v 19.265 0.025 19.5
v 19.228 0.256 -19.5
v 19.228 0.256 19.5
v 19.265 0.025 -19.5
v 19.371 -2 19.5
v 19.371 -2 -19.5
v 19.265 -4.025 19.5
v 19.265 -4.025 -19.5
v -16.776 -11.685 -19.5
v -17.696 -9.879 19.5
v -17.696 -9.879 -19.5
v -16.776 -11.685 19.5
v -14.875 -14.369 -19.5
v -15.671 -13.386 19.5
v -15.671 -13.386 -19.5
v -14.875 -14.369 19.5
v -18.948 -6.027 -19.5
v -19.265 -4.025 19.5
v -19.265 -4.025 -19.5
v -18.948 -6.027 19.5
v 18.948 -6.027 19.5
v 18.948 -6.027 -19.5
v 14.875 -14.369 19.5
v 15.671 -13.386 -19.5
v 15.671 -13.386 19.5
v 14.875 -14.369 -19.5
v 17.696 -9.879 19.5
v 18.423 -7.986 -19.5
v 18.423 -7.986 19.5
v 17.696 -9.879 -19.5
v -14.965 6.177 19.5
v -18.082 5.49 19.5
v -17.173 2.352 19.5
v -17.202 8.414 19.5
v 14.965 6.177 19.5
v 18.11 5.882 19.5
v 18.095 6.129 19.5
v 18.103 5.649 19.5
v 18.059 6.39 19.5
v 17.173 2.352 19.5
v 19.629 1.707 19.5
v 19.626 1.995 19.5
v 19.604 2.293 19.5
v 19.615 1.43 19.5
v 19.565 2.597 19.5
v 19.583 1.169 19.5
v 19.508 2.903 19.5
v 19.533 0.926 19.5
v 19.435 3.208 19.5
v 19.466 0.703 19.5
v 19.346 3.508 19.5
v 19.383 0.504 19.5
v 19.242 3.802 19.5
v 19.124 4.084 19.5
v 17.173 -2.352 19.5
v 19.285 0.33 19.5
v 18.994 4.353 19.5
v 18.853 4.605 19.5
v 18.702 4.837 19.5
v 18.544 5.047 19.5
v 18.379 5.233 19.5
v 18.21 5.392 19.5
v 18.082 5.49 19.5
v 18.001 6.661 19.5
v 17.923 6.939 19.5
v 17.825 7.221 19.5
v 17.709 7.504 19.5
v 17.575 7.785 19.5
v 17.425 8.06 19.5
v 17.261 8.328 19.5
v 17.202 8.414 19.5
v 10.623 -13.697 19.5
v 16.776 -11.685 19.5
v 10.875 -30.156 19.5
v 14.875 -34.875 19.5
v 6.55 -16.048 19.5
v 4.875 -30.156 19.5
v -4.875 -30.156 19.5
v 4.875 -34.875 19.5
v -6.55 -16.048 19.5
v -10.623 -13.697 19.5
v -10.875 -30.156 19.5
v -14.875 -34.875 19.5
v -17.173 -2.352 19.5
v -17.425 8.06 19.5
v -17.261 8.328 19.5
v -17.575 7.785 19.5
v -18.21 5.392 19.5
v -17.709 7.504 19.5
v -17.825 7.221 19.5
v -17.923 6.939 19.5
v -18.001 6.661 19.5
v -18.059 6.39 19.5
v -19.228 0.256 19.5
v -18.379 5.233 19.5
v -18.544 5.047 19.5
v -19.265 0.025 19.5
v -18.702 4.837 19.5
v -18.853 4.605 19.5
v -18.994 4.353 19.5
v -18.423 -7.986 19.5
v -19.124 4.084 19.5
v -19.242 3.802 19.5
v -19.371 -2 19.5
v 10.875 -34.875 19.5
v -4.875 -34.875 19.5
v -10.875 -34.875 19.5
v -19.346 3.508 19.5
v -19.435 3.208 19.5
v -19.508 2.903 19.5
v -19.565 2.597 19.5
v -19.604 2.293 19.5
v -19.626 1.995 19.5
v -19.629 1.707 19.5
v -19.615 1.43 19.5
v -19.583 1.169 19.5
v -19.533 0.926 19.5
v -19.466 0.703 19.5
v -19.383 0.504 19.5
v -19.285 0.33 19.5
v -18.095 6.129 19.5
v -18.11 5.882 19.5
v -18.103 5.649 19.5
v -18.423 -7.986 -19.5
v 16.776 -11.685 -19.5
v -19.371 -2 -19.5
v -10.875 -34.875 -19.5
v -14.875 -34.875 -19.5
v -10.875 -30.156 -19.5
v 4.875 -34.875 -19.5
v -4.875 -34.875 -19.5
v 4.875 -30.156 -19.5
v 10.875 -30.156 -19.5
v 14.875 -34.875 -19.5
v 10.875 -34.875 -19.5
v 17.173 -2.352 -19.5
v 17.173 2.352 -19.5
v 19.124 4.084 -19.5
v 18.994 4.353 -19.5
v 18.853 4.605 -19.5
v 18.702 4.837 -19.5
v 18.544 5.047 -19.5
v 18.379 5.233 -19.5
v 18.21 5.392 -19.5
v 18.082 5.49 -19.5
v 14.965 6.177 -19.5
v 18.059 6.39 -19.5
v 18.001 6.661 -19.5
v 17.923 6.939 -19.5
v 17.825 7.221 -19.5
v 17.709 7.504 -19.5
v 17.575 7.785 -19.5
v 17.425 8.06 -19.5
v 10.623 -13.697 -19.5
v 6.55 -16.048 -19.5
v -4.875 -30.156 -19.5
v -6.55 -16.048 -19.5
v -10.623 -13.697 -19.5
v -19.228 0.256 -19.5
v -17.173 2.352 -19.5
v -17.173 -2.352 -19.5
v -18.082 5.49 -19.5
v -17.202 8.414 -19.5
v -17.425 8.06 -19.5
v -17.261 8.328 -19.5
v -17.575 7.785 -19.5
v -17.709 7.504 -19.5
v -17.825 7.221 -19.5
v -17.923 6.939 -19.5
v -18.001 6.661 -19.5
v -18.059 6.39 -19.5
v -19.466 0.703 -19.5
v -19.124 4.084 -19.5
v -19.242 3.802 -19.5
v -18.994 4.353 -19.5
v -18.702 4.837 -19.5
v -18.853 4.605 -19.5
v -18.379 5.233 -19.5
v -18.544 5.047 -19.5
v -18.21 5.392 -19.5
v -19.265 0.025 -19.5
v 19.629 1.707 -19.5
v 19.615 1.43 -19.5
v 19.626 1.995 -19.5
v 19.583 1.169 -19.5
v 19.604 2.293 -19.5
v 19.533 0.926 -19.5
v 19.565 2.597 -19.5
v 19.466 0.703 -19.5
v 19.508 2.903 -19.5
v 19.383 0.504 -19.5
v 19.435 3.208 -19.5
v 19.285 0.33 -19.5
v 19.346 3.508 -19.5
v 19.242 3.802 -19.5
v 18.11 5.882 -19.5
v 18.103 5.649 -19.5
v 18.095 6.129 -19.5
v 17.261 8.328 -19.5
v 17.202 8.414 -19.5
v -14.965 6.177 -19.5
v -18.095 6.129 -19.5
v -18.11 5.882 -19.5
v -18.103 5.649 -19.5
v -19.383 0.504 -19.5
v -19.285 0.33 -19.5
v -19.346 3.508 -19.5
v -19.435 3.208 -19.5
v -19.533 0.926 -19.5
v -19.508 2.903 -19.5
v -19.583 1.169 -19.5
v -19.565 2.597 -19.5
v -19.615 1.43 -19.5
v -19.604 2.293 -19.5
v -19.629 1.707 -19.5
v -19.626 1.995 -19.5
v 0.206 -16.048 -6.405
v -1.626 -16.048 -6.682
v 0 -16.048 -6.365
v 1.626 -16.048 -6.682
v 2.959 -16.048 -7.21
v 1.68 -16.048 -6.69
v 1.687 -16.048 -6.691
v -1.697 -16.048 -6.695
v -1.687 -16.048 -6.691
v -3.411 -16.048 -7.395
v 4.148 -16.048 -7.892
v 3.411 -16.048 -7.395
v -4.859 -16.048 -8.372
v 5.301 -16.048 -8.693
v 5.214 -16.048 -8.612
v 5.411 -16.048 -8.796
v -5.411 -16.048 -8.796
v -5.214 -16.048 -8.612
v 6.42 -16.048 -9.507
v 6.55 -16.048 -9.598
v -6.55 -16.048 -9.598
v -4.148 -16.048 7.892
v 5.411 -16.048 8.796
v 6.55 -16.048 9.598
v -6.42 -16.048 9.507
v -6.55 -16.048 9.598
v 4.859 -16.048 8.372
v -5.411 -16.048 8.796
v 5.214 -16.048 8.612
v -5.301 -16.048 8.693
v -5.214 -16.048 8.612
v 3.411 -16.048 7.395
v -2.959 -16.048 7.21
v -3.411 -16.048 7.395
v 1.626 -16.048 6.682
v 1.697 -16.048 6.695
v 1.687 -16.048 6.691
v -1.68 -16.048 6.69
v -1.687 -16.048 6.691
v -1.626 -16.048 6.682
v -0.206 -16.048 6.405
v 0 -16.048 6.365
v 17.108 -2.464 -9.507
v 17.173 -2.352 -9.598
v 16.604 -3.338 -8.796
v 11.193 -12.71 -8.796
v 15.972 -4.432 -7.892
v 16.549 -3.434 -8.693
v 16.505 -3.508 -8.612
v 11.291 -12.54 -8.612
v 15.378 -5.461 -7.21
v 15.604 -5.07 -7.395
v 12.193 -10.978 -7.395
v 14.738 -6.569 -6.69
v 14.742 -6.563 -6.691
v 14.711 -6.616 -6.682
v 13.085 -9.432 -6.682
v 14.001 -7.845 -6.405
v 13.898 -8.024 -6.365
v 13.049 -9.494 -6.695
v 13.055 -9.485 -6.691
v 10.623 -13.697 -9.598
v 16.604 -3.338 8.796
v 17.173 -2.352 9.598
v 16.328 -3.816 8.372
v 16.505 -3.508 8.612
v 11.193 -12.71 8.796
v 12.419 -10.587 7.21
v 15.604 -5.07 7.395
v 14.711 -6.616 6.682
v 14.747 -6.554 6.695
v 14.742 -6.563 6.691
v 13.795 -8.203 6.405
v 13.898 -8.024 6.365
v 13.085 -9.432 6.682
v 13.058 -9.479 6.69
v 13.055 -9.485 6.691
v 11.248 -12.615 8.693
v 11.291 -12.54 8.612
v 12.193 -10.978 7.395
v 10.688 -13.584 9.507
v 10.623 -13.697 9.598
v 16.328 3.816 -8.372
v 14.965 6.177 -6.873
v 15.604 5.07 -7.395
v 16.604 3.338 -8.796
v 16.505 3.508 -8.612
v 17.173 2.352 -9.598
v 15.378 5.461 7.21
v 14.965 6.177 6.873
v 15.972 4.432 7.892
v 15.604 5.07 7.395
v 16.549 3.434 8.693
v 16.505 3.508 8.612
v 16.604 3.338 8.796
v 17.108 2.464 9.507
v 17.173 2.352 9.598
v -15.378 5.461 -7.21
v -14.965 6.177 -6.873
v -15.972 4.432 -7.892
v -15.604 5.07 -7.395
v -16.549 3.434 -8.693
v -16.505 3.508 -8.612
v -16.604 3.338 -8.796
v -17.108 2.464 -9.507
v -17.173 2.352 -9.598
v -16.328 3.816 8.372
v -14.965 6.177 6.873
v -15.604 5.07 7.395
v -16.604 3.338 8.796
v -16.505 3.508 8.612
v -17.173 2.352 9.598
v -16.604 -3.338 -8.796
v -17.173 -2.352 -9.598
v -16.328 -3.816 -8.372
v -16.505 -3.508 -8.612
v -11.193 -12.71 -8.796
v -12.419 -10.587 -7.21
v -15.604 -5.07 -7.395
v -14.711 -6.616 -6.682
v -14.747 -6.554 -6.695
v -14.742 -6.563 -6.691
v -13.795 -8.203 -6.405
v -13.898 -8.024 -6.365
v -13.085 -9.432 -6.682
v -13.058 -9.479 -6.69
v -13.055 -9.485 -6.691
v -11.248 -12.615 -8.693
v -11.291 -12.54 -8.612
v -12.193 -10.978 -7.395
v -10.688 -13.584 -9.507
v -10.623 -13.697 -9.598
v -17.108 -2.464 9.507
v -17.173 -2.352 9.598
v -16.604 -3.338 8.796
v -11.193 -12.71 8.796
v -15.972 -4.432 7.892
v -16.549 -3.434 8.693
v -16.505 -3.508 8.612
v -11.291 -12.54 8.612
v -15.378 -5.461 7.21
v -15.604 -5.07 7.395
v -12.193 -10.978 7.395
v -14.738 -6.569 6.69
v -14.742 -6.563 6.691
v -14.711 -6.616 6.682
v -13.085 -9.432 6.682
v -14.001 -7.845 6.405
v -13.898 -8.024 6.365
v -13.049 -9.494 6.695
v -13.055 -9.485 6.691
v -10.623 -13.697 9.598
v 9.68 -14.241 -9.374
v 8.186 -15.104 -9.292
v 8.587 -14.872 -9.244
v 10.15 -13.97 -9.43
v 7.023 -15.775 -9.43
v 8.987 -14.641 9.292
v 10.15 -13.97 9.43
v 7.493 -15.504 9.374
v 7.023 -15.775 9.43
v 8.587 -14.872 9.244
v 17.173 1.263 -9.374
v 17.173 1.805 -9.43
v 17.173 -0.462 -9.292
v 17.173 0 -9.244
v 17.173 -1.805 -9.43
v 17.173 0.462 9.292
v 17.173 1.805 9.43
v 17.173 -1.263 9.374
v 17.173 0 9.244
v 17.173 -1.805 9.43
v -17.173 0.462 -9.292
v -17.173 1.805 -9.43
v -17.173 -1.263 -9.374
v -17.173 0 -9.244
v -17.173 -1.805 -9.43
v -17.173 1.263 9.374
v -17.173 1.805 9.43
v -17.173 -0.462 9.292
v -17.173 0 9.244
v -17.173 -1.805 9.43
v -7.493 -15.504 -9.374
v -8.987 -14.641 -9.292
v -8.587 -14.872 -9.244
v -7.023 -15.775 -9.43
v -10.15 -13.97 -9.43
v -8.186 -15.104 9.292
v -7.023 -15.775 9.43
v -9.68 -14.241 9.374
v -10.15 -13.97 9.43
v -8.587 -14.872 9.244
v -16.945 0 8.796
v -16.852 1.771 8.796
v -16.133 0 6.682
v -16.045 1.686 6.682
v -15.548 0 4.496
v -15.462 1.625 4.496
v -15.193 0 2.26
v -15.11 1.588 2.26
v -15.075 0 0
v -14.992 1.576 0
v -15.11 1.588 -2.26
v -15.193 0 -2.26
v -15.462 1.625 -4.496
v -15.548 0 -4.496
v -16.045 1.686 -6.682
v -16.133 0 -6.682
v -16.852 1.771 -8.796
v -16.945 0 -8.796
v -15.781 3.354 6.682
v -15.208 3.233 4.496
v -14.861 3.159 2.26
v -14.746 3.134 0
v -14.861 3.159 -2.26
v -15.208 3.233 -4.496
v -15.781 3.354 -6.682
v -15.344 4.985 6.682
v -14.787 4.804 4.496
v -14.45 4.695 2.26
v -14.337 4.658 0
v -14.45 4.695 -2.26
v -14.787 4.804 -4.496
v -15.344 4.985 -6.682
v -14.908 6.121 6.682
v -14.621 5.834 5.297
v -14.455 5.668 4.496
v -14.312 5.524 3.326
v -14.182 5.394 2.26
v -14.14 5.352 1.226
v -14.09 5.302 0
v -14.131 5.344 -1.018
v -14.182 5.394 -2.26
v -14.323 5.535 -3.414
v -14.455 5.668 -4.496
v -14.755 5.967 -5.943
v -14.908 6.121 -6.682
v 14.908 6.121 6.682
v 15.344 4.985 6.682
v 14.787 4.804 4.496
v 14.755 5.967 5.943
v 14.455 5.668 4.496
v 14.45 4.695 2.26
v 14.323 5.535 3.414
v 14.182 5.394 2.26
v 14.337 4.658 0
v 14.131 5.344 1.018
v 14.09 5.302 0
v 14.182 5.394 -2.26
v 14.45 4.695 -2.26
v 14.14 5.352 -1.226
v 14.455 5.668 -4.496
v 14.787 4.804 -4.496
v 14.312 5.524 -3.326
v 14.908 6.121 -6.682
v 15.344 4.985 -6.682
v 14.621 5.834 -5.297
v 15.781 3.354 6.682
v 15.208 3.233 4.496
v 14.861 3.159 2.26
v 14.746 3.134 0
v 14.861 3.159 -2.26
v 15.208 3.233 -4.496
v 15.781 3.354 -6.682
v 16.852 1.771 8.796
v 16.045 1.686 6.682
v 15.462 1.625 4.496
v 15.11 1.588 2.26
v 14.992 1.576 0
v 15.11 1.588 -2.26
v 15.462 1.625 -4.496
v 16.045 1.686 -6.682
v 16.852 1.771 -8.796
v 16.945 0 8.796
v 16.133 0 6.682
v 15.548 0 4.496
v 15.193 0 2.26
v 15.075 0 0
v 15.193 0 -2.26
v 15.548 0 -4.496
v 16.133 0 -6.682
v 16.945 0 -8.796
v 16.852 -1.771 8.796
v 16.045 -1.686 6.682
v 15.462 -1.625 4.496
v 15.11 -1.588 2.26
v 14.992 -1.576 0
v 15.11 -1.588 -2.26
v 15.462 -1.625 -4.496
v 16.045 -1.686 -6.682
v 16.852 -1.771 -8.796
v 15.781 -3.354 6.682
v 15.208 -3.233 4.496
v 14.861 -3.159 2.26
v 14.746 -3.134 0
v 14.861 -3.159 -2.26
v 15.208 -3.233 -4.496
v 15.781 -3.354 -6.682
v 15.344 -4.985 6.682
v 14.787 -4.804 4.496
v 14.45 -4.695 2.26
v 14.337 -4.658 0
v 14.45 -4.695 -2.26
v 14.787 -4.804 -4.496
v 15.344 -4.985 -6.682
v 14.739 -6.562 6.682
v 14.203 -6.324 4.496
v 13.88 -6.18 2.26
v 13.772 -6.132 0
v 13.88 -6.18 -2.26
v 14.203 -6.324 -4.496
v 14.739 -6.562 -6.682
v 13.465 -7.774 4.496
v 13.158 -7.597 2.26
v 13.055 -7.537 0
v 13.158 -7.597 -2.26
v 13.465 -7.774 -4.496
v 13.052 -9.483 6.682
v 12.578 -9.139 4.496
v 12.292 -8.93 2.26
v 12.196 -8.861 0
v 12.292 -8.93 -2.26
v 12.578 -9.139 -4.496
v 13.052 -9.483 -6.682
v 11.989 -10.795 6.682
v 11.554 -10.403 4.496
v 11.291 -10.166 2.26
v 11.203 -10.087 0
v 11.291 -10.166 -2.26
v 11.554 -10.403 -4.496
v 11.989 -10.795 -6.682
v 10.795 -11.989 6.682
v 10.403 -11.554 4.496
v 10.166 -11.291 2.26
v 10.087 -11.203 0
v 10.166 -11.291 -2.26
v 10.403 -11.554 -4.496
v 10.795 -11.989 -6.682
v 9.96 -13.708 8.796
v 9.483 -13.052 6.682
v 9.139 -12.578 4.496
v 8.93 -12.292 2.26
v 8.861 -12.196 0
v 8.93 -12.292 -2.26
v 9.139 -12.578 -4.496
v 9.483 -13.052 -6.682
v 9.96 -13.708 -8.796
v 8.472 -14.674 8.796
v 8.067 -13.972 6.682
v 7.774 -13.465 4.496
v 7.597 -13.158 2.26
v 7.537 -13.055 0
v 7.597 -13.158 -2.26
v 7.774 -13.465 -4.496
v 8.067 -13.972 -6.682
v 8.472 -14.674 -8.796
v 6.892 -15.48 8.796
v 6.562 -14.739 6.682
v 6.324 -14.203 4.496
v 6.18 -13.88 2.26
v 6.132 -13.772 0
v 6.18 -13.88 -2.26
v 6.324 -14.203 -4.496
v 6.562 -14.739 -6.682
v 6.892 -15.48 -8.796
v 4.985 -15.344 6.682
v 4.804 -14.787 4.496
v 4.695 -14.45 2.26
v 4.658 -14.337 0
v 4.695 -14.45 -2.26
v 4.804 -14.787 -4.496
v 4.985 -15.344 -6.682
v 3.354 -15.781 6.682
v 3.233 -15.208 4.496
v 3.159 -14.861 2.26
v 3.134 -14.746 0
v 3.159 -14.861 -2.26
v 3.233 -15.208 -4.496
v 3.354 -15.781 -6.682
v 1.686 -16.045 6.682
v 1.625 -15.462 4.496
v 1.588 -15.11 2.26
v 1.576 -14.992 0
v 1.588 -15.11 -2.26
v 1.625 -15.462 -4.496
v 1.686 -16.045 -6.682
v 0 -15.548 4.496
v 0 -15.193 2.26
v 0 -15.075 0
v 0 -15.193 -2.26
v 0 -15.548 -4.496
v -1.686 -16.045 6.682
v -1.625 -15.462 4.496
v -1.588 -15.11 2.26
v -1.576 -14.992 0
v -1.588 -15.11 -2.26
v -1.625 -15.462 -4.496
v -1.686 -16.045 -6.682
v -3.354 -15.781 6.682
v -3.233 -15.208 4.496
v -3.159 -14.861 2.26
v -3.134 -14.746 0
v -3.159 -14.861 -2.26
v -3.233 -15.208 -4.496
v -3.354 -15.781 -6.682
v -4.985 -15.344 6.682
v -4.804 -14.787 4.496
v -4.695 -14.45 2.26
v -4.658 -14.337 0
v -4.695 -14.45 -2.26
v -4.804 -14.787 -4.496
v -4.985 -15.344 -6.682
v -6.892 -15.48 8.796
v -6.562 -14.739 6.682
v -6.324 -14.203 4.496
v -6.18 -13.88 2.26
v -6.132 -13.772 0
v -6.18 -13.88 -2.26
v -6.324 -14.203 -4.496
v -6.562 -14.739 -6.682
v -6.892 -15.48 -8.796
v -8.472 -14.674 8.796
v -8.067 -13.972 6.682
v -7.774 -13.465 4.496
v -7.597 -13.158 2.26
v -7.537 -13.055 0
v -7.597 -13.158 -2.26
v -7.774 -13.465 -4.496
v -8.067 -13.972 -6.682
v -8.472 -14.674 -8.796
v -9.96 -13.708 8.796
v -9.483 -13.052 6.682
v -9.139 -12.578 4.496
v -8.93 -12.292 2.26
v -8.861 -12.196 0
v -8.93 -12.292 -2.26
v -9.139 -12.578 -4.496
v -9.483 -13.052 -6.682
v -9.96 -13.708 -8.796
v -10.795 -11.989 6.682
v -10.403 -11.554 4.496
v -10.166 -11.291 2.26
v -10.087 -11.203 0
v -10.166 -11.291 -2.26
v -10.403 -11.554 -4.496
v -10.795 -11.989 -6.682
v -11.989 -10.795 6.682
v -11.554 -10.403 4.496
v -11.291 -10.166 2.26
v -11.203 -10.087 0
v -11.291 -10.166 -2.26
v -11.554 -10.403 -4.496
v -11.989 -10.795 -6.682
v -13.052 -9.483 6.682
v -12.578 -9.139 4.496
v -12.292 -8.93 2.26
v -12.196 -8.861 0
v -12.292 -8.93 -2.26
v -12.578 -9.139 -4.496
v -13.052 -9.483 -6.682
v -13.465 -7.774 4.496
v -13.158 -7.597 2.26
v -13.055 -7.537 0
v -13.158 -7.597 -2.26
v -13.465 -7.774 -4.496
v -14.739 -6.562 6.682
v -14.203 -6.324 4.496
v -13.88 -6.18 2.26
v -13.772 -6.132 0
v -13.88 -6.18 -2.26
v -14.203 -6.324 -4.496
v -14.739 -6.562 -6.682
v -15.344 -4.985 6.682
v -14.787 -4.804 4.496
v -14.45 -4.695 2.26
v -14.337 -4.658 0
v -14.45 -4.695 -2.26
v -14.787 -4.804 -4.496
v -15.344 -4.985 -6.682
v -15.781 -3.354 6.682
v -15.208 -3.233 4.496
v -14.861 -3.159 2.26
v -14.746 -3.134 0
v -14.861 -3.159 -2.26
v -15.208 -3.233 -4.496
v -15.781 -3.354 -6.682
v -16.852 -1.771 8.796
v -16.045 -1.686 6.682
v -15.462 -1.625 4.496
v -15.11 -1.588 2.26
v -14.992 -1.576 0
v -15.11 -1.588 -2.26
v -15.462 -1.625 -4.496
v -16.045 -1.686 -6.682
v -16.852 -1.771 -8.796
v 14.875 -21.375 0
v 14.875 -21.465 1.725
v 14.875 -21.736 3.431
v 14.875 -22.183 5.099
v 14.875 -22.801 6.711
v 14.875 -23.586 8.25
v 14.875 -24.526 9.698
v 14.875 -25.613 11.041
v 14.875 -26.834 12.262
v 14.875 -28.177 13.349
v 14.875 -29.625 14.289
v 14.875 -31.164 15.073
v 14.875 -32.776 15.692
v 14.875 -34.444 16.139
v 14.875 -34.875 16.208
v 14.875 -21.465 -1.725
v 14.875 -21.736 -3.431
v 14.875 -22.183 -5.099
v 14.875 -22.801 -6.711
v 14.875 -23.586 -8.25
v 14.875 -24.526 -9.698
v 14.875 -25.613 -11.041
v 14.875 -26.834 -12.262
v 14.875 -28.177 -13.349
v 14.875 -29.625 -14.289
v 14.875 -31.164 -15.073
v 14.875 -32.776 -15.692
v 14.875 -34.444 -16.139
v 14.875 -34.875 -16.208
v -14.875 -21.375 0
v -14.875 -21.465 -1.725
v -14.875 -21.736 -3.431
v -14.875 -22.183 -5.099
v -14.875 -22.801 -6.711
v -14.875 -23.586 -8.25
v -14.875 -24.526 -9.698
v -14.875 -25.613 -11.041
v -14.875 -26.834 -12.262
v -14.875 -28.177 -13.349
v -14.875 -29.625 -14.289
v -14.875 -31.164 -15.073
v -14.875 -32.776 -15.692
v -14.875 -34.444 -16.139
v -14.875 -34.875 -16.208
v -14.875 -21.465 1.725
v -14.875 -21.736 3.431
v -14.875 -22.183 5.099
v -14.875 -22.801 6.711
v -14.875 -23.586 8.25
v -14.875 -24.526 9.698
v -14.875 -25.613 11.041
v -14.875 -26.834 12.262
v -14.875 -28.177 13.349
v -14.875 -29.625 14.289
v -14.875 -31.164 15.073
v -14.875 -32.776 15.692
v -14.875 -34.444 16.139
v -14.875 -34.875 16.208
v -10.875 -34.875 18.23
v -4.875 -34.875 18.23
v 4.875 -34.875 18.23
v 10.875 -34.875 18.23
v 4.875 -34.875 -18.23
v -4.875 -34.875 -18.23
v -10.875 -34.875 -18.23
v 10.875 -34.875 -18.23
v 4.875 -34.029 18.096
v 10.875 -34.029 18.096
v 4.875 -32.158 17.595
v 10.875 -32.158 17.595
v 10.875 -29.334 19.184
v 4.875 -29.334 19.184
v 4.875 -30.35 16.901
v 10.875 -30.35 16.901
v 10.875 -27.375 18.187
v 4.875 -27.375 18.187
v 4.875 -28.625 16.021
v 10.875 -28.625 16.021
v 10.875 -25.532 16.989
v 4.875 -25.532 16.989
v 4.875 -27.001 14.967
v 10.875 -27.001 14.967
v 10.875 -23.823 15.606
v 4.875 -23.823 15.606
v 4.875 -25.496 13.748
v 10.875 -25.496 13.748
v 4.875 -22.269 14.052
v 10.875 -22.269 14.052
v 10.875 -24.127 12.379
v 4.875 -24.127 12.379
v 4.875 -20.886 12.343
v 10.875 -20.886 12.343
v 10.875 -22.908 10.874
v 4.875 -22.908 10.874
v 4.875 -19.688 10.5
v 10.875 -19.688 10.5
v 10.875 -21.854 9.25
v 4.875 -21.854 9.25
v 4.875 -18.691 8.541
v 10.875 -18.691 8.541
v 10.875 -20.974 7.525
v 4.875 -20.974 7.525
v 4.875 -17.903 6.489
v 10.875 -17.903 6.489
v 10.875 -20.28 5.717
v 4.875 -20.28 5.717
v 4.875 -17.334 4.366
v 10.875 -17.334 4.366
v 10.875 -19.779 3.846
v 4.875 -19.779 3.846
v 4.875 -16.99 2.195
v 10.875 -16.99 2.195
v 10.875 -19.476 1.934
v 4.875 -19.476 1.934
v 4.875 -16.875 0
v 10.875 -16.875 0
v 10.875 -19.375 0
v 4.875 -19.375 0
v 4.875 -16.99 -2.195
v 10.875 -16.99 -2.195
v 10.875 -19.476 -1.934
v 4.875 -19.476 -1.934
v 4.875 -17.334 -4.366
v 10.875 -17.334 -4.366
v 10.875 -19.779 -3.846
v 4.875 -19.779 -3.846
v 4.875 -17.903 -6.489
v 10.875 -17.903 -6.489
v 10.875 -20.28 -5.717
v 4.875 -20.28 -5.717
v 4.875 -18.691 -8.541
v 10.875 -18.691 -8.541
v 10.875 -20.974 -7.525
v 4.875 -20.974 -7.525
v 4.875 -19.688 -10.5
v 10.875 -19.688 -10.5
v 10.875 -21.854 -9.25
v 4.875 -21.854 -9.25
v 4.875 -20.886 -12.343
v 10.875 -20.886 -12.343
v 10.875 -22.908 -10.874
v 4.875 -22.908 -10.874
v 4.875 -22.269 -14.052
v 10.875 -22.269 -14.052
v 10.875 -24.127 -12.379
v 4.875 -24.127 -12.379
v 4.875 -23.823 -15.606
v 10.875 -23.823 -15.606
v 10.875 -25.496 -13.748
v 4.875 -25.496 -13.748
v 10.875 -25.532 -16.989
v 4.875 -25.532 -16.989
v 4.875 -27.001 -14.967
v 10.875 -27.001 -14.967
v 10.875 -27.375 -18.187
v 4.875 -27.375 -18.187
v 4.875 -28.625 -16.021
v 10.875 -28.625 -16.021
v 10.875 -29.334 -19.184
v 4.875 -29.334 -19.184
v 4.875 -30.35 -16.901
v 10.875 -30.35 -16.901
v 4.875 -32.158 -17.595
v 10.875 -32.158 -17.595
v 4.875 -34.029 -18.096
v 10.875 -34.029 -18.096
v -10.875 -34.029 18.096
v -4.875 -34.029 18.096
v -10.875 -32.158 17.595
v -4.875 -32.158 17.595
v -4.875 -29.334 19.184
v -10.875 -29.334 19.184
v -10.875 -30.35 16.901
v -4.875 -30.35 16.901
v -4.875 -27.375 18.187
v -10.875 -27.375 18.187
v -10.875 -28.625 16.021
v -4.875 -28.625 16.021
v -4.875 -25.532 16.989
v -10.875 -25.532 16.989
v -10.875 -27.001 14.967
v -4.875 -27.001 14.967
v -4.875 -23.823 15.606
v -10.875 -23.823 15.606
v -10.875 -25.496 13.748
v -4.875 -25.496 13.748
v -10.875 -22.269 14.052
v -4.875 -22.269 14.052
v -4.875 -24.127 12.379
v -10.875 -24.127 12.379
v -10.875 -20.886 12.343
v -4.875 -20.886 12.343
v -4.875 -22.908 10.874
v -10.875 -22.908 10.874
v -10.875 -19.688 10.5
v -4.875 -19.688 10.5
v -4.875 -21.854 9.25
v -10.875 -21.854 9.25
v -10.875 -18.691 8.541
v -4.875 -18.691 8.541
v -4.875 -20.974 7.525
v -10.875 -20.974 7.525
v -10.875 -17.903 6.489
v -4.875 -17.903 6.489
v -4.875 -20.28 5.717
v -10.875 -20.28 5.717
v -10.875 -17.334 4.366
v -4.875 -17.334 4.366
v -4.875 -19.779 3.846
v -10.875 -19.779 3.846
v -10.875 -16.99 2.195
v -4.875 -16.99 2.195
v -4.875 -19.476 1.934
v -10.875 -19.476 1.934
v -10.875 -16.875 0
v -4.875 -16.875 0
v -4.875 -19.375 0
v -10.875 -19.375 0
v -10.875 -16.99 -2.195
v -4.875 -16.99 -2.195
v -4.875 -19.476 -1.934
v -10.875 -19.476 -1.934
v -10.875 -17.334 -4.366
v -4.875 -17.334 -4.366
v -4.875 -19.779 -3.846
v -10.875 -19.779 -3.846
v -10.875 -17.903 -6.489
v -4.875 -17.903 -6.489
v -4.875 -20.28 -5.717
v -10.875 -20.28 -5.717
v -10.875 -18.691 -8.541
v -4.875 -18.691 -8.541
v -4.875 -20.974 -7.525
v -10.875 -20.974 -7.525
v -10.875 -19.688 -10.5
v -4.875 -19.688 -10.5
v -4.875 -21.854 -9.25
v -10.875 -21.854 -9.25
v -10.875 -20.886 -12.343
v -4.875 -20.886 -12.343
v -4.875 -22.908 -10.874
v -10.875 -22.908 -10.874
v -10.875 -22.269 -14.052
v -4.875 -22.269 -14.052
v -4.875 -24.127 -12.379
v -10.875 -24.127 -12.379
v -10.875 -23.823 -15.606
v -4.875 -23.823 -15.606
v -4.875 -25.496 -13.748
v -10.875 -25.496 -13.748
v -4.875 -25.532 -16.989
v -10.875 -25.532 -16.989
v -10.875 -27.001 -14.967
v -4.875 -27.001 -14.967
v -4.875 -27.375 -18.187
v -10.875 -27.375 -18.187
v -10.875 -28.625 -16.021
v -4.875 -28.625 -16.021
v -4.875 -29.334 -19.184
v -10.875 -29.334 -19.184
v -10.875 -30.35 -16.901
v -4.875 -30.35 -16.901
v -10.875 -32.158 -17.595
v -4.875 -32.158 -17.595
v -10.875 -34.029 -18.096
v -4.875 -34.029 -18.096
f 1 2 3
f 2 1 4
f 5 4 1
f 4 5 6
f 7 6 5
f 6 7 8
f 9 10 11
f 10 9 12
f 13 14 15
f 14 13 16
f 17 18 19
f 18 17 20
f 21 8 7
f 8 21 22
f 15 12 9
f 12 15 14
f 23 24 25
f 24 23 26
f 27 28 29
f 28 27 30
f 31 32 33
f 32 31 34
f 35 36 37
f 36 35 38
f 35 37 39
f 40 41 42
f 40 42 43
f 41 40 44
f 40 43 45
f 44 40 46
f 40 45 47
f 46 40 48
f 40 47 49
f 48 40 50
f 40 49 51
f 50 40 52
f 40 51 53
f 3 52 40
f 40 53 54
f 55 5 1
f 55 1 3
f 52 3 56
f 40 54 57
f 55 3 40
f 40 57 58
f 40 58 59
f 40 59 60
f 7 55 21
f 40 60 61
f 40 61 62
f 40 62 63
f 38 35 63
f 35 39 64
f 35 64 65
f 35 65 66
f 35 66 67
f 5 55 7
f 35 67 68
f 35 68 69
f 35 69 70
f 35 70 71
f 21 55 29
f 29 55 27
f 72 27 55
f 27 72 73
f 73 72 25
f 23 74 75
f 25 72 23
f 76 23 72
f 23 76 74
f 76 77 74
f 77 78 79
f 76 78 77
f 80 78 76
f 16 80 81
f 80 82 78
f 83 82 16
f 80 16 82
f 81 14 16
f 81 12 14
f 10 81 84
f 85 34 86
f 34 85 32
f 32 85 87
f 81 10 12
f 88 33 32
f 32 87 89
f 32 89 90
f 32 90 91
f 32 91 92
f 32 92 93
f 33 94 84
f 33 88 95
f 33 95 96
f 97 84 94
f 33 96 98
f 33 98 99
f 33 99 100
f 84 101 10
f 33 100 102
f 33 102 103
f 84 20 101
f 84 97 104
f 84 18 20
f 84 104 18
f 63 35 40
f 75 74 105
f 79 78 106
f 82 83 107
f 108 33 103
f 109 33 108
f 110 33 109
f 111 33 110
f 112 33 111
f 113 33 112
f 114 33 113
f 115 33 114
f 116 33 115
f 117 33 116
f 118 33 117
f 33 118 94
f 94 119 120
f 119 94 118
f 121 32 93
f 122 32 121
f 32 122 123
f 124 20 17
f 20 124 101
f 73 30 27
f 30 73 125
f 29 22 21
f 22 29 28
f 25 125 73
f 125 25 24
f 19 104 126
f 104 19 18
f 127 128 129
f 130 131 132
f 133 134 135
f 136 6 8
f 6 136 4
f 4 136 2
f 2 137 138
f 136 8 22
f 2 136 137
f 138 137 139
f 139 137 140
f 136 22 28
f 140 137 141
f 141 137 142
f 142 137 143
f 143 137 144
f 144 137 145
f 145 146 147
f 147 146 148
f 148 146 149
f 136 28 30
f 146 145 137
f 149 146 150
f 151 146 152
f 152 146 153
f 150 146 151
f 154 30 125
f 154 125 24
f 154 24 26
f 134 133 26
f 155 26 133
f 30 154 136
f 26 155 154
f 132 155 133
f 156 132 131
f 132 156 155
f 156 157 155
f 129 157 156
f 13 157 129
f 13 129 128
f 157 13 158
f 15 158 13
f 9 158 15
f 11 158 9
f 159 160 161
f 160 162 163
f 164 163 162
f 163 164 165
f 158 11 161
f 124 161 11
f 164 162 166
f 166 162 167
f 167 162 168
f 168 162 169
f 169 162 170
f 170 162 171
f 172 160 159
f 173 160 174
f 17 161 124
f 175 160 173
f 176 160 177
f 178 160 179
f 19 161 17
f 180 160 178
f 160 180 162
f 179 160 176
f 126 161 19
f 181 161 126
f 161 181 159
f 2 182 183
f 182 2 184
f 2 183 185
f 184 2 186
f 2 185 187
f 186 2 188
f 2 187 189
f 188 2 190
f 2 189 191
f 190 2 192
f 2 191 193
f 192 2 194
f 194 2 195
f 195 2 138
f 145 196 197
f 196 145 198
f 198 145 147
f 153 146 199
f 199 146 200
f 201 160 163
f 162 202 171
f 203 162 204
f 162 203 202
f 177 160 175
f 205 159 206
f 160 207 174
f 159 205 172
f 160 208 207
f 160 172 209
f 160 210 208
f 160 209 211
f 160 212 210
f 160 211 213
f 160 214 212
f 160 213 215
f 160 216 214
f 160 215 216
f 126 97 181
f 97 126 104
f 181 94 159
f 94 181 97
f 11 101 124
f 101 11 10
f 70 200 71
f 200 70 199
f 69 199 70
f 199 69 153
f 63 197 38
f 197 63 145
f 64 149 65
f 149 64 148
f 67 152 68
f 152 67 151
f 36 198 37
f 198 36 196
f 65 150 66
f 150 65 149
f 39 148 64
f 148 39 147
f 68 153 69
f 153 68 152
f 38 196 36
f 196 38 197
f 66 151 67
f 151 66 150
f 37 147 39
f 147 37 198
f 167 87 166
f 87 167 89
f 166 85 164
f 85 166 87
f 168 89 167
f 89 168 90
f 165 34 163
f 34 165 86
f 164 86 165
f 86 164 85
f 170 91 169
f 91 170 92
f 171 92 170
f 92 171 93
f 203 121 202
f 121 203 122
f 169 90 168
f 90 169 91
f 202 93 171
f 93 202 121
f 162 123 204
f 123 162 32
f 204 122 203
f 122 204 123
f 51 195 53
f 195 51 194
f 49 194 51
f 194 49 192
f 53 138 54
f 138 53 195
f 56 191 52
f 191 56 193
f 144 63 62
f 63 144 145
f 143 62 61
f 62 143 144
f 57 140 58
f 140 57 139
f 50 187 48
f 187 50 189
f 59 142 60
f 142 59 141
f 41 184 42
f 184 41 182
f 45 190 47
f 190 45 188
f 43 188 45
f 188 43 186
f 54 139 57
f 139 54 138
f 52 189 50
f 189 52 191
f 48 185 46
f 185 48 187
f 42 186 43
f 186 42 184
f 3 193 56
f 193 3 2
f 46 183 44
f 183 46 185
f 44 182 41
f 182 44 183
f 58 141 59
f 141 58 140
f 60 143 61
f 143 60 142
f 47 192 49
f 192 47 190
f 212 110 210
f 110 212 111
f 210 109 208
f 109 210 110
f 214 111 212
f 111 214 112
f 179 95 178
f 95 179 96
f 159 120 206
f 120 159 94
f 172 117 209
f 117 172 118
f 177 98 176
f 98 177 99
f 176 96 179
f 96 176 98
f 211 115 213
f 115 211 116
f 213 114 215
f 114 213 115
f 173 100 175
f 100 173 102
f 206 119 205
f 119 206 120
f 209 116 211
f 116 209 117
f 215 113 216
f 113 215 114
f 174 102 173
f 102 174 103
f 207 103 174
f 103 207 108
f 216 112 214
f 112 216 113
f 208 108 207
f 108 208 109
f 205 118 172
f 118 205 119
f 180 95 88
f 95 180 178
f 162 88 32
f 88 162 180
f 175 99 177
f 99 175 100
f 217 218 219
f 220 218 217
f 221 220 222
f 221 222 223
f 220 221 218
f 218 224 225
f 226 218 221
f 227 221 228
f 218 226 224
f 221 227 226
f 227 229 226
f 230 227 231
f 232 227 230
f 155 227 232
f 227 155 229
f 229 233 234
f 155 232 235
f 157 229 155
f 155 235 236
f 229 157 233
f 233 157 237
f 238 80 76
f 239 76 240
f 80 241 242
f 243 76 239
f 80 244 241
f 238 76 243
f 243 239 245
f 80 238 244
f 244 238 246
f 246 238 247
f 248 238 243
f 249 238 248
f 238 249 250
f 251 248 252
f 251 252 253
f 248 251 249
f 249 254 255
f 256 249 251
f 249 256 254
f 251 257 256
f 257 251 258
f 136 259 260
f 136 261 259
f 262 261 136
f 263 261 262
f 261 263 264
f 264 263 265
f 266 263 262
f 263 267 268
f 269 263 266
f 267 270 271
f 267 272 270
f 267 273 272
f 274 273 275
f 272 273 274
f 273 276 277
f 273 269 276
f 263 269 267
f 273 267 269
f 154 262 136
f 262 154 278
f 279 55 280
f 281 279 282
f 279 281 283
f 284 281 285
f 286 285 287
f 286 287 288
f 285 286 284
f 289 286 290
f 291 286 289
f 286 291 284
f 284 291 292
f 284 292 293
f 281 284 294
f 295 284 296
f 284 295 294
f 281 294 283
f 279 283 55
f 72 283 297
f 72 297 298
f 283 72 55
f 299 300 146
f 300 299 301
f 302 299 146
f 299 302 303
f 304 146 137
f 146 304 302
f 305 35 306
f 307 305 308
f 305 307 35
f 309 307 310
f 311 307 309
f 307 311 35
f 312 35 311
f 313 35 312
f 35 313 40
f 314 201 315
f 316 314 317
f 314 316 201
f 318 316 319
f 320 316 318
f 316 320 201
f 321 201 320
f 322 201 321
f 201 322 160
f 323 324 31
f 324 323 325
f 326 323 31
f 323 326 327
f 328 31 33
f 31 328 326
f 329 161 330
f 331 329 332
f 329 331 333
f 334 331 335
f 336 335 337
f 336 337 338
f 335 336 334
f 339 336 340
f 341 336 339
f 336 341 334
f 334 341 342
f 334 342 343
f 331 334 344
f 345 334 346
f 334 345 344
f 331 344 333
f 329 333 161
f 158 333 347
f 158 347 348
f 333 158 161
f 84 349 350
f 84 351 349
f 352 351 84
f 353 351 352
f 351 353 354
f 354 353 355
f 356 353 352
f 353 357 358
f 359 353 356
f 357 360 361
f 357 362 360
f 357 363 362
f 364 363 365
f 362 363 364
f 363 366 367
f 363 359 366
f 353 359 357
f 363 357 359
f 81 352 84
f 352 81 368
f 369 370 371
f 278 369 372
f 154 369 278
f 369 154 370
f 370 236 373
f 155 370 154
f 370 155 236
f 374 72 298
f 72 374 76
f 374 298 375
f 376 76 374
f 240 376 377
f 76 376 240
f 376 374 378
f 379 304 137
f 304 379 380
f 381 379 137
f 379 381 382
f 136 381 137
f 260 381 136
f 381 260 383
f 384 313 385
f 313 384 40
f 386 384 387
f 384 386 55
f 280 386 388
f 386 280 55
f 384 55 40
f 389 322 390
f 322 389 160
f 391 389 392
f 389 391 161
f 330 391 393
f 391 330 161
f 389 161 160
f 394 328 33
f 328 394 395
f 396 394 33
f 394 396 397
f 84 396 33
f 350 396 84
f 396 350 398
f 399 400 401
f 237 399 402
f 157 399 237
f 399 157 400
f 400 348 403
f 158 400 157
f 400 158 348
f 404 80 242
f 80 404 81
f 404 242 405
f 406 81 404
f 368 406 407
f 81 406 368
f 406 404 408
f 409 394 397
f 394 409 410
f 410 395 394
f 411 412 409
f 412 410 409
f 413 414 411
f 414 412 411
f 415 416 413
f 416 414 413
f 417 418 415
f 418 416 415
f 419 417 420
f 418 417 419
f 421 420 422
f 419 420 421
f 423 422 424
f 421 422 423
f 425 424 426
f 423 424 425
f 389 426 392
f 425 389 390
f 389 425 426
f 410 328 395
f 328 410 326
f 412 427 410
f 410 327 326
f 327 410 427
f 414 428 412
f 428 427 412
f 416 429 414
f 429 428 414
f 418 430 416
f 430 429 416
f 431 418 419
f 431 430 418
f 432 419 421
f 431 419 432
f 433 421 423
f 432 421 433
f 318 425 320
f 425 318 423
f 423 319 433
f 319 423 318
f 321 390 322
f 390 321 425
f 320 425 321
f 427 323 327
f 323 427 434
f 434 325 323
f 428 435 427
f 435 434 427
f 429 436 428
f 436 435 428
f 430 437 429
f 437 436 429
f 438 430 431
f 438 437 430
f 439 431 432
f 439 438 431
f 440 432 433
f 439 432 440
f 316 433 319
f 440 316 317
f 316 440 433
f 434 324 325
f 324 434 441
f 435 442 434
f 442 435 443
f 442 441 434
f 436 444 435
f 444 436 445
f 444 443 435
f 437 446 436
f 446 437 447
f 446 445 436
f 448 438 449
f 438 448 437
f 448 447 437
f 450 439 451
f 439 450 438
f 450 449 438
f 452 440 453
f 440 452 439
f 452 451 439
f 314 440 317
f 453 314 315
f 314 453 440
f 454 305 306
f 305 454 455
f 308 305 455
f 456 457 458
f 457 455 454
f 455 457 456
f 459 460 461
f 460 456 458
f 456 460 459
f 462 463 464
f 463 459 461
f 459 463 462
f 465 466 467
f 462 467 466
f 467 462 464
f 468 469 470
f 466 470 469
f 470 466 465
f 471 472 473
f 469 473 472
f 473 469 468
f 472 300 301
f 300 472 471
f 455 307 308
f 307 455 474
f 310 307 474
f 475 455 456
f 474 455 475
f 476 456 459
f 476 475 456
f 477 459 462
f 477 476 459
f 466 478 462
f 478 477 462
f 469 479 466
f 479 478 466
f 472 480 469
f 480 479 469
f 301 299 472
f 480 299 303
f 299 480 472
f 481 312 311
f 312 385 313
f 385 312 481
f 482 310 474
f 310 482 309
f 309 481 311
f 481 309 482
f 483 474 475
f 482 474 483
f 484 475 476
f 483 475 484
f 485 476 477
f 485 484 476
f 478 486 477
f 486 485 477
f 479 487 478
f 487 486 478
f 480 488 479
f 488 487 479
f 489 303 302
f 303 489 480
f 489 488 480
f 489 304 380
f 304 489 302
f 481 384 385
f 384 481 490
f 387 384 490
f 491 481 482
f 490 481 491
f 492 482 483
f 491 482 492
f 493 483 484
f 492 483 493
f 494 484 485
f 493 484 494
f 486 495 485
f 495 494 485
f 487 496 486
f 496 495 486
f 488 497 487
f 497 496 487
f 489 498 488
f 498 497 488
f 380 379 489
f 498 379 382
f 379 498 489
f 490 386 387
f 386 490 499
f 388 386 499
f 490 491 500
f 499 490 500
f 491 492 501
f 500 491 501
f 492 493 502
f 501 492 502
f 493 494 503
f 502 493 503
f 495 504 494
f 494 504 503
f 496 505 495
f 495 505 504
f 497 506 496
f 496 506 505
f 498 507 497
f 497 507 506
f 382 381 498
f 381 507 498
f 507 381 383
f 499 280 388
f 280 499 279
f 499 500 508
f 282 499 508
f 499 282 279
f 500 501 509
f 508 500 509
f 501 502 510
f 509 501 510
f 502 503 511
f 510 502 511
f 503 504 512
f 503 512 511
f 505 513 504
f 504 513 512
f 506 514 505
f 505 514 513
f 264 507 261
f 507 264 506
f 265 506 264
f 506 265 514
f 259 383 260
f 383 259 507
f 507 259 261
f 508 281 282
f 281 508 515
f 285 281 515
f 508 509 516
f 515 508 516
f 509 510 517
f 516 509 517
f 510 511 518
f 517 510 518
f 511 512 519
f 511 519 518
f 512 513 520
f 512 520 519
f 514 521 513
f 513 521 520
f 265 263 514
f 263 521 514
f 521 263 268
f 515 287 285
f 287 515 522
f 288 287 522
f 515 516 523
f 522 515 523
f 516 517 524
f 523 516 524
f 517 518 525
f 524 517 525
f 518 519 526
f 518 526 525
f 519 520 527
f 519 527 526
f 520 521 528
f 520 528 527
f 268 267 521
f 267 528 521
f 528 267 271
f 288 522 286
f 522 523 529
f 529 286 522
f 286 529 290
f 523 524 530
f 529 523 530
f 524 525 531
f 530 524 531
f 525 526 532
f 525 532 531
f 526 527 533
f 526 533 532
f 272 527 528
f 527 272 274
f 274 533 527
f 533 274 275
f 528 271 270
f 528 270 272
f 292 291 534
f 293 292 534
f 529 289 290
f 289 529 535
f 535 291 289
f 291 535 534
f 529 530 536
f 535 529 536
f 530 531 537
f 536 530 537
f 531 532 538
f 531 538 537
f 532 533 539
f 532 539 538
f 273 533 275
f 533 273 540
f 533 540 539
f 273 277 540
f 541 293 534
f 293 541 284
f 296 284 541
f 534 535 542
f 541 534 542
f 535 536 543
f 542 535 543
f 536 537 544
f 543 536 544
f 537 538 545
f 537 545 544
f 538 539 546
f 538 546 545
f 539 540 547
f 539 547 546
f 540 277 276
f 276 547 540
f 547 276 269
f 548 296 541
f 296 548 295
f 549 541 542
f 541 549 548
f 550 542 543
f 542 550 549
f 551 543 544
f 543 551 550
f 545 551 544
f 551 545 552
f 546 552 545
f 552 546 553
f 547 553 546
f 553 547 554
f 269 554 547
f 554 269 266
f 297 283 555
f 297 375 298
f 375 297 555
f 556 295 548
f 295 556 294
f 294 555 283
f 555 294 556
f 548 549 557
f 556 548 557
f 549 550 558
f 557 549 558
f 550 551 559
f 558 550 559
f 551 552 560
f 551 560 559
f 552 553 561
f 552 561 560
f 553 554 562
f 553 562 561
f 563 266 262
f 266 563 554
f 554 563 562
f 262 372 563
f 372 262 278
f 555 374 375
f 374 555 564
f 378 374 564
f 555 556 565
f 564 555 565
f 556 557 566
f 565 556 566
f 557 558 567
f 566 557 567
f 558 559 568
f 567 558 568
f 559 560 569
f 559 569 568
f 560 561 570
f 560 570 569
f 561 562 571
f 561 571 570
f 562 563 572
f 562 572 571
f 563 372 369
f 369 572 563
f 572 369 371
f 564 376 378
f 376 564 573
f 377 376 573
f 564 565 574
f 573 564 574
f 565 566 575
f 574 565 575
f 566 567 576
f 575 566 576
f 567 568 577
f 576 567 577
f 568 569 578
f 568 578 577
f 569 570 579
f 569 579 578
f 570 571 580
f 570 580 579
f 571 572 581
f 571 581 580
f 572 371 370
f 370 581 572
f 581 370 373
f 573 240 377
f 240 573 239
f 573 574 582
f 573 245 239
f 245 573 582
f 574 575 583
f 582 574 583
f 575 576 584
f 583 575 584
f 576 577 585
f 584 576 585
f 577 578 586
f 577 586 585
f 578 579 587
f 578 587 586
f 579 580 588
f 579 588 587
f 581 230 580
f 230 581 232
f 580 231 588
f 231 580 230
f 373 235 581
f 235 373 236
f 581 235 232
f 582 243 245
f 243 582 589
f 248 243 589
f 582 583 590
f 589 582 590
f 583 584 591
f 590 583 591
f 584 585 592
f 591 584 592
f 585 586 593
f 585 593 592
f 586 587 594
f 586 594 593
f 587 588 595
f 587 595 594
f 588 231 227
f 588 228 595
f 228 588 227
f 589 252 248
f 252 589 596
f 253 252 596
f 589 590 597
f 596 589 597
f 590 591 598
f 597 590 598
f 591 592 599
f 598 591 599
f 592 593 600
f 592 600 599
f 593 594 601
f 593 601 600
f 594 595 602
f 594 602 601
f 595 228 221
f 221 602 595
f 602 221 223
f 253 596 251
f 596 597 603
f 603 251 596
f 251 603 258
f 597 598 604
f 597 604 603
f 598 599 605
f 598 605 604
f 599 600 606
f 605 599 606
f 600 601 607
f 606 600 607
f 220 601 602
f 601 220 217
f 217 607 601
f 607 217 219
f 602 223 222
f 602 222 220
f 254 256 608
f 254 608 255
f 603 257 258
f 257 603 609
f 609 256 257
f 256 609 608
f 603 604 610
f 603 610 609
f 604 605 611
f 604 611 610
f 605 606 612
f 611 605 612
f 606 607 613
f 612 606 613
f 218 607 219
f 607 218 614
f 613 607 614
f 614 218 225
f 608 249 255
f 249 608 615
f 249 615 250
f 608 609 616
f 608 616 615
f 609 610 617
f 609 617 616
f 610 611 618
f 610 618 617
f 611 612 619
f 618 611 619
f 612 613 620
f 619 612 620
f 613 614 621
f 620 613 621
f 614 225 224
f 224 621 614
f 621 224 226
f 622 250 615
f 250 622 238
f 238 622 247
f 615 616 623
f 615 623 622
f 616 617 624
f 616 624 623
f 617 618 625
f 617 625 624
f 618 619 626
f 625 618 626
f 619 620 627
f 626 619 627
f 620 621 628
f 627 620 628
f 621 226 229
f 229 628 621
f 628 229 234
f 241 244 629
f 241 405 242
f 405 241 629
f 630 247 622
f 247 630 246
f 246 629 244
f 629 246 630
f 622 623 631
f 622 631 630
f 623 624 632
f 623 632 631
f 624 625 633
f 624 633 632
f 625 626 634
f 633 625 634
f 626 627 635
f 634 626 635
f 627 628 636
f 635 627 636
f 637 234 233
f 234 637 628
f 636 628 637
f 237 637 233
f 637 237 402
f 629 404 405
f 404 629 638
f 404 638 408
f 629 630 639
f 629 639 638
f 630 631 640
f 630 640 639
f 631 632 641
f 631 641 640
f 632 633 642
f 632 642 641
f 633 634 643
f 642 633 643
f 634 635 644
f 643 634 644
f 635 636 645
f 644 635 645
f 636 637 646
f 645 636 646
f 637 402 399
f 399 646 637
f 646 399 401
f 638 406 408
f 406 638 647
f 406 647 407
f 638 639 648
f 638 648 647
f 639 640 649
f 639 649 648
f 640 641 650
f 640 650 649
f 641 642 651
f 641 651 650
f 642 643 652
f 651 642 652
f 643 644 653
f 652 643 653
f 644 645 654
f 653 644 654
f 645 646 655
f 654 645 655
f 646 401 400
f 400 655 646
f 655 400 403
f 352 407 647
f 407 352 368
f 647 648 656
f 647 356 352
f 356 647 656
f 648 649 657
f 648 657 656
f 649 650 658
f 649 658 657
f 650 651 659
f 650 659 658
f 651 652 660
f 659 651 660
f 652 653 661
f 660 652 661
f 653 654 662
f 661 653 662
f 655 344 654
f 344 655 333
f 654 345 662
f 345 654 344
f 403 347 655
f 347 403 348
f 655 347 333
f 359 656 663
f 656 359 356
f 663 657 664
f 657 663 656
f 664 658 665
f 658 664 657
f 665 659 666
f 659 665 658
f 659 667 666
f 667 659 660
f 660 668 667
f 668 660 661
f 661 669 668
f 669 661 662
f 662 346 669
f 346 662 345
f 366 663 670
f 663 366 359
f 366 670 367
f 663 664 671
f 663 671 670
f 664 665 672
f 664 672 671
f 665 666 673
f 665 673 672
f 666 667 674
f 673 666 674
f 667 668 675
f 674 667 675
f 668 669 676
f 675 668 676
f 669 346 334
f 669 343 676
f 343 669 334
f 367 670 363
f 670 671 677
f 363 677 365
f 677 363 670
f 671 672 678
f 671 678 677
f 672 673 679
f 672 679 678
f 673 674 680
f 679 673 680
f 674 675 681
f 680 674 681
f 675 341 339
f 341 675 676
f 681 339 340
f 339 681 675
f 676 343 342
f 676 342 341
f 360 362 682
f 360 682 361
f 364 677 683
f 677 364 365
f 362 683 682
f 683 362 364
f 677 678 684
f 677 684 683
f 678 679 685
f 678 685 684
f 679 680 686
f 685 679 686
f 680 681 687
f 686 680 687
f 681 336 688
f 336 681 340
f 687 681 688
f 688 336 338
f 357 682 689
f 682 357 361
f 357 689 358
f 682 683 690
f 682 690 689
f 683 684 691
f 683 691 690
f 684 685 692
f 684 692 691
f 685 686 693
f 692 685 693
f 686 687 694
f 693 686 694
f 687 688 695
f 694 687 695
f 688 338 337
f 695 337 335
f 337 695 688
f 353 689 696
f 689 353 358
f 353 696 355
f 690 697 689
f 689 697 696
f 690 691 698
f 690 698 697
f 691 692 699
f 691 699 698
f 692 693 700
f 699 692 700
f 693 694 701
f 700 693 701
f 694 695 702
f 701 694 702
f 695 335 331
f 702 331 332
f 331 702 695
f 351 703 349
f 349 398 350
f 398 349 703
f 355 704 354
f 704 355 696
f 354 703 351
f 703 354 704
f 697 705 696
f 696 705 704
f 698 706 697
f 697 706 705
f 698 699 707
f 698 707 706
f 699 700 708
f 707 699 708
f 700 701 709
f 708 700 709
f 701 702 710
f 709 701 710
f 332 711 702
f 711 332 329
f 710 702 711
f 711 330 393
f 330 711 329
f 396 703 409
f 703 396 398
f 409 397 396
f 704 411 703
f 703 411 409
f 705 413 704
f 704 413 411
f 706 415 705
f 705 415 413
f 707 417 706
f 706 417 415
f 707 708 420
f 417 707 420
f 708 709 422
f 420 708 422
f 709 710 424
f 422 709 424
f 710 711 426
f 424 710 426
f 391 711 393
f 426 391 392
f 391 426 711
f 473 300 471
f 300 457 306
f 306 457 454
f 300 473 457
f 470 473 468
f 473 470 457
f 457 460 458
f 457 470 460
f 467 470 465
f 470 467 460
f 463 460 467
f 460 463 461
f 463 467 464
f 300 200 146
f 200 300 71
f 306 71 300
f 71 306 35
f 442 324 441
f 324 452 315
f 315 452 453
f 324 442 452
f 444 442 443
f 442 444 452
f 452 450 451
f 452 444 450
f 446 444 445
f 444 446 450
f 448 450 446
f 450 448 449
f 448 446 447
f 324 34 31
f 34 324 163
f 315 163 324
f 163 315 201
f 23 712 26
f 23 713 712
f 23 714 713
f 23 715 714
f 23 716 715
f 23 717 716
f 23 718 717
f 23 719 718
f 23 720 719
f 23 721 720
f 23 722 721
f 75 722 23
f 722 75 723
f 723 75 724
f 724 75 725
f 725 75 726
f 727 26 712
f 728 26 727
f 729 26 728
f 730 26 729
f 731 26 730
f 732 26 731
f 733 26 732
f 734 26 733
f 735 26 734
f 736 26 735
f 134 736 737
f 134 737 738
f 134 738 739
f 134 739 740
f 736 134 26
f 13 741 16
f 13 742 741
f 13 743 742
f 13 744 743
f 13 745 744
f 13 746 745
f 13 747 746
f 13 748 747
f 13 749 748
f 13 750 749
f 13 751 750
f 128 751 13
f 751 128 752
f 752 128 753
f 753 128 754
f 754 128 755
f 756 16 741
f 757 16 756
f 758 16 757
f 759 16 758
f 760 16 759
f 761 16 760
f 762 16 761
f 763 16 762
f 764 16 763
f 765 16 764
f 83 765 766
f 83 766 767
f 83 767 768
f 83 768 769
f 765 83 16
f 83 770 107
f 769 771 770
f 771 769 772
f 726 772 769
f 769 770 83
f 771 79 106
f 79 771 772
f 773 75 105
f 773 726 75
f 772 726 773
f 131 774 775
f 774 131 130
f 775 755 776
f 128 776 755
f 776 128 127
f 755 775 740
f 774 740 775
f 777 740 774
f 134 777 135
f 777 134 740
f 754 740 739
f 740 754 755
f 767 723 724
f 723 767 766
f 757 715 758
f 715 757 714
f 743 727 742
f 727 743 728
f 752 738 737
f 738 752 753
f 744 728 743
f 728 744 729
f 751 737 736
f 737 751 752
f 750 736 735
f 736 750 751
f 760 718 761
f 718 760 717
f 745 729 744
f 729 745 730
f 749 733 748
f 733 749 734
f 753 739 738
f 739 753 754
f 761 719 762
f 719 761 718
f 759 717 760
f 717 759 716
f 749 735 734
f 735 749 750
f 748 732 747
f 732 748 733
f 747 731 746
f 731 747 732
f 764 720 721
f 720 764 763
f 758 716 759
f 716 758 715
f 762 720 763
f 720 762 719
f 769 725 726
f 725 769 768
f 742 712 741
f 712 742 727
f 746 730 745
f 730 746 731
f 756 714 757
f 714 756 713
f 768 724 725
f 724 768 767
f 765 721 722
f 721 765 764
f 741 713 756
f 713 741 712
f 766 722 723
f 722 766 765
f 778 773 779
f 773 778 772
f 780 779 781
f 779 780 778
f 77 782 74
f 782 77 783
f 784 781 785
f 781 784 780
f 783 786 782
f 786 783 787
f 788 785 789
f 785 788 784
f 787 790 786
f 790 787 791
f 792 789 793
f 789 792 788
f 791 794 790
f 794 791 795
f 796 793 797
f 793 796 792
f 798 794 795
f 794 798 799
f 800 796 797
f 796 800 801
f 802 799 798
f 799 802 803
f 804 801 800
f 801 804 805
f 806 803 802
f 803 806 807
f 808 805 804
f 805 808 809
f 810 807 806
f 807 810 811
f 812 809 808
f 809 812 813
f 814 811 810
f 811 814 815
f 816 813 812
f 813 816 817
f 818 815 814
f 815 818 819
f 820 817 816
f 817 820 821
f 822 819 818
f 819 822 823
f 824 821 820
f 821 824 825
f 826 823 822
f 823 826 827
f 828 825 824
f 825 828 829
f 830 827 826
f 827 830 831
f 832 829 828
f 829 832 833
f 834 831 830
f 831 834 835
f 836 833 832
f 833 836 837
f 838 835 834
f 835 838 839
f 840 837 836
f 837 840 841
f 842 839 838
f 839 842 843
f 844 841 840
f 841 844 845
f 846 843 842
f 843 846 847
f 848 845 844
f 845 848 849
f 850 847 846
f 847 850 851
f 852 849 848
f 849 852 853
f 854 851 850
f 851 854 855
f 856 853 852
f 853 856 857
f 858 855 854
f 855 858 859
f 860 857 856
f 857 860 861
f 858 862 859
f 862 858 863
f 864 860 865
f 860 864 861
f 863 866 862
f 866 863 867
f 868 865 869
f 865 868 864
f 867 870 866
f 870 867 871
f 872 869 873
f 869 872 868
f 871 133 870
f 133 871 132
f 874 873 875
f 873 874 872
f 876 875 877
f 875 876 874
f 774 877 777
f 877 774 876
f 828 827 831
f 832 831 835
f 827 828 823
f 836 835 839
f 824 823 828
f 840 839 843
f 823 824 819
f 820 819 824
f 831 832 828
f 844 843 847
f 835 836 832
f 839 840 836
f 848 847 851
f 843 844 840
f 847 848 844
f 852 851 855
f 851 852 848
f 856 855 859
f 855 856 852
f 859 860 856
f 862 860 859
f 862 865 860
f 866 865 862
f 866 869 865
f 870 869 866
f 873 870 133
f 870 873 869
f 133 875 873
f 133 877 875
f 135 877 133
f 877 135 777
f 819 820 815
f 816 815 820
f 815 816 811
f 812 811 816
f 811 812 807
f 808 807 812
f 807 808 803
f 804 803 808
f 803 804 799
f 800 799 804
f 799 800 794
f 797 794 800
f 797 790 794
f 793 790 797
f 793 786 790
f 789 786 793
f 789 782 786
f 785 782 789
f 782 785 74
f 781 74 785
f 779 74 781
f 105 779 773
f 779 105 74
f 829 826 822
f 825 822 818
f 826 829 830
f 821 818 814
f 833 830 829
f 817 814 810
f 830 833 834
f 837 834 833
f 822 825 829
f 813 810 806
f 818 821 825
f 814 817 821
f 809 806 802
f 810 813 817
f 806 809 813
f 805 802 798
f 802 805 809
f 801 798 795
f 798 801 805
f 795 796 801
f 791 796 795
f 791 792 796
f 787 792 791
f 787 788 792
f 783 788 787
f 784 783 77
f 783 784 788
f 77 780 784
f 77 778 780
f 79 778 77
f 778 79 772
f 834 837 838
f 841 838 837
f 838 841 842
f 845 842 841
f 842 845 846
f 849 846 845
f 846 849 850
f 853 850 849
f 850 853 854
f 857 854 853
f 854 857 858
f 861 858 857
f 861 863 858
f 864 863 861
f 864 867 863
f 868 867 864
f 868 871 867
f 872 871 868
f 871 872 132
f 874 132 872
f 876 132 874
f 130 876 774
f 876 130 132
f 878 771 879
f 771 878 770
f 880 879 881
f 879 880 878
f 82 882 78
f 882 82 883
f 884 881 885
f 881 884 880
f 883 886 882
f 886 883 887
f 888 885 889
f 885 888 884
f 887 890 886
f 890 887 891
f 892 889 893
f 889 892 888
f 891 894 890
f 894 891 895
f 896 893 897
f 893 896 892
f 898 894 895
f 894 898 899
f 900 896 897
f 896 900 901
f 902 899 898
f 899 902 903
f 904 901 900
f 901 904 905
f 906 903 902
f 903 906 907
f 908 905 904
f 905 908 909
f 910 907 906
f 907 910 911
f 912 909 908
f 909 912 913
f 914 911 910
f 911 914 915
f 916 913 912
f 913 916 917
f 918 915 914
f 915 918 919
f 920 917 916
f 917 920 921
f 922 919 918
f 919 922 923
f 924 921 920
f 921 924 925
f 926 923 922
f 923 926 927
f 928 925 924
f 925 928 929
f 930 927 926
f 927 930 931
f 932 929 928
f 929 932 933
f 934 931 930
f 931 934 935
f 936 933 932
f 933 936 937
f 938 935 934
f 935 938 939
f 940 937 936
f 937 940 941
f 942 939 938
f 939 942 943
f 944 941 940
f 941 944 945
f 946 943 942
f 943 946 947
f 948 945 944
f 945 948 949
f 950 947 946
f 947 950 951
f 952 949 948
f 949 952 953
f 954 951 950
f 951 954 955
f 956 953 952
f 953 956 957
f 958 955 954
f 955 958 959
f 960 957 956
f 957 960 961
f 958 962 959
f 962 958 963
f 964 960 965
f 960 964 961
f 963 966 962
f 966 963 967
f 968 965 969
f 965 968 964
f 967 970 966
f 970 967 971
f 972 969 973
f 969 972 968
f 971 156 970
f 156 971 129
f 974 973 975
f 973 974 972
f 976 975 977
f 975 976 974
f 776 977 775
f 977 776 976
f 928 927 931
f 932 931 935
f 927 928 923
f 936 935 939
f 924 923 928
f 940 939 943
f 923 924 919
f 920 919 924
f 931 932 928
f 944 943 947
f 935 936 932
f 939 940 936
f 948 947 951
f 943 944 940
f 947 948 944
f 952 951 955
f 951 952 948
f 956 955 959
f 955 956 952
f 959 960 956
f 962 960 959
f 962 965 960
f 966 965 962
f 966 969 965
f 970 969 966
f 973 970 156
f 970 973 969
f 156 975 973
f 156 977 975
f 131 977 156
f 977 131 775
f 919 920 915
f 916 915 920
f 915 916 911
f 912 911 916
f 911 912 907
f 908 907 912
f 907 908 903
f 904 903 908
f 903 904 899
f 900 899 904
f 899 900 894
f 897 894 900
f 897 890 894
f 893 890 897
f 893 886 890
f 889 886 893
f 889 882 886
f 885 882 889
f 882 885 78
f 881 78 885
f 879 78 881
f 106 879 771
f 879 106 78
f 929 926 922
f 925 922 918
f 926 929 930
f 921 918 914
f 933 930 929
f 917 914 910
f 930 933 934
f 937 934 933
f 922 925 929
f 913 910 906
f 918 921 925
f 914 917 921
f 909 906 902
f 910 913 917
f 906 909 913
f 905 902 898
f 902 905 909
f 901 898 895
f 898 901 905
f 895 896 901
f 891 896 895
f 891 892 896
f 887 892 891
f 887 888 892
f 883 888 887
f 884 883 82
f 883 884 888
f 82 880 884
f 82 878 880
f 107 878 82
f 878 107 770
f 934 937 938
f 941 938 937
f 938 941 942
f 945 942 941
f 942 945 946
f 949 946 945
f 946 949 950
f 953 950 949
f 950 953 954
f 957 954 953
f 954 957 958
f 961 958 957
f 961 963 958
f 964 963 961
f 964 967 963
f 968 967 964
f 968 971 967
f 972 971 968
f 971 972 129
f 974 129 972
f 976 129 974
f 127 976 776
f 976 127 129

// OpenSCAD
// [FL_INDEX: keywords="openscad, 3d_parametric, Openscad_hexbright_handlebar_mount_snap, csg_solid" | COT="Parametric OpenSCAD design from 3DCodeverse"]
// Title: Openscad hexbright handlebar mount snap

handlebarDiameter = 32;
fudj = 0.2;
mmIn = 25.4 * 1;
hexlightFlatDistance = 1.25 * mmIn;
handlebarD = handlebarDiameter + 0.8 + fudj; // inner tube is .8mm thick
len = handlebarD + 6;
$fn = 60;

apothem = hexlightFlatDistance/2;
circumradius = apothem/cos(180/6) + fudj;

apothemminor = 34/2;
circumradiusminor = apothemminor/cos(180/6) + fudj;

sagitta = 1 + 0;
chordy = 13 + 0;
cutoutR = (chordy*chordy)/(8*sagitta) + sagitta/2;

addedThickness = 0.42 * 2;

difference() {
	union() {
		hexMount();
		handlebarMount();
	}
	#zipCutouts();
}

module hexMount() {
	difference() {
		outer();
		hexBrightBody();
		cutout();
	}
}

yOffset = -handlebarD/2 - hexlightFlatDistance/2 - 0.5;

module handlebarMount() {
	difference() {
		translate([-(hexlightFlatDistance-2)/2, yOffset - 2, -len/2])
			cube(size=[hexlightFlatDistance-2, handlebarD, len], center=false);
		translate([0,yOffset - 5,0])
			rotate([0,90,0]) cylinder(r=handlebarD/2, h=len, center=true);
		hexBrightBody();
	}
}

module zipCutouts() {
	translate([hexlightFlatDistance/2 - 8,0,0]) zipCutout();
	translate([-(hexlightFlatDistance/2 - 8),0,0]) zipCutout();
}
module zipCutout() {
	translate([0,yOffset - 5,0])
	rotate([0,90,0])
	rotate_extrude()
	translate([handlebarD/2 + 1.25 + 2, 0, 0])
		square(size=[2.5, 6], center=true);
}

module hexBrightBody() {
	// translate([0,0,10]) cube(size=[hexlightFlatDistance, hexlightFlatDistance, hexlightFlatDistance], center=true);
	// translate([0,0,10]) cube(size=[34, 34, 34], center=true);
	difference() {
		intersection() {
			cylinder(r=circumradius, h=len+1, center=true, $fn=6);
			rotate([0,0,360/12]) cylinder(r=circumradiusminor, h=len+2, center=true, $fn=6);
		}
		hexBrightBodyFillet();
	}
}
module hexBrightBodyFillet() {
	intersection() {
		rotate_extrude($fn=60)
			translate([cutoutR + hexlightFlatDistance/2 + fudj - sagitta,0,0])
				circle(r=cutoutR); 
		outer();
	}
}
outerYOff = -2;
module outer() {
	translate([0,outerYOff,0]) cylinder(r=circumradius + addedThickness, h=len, center=true);
	rib(30);
	rib(180-30);
	rib(15);
	rib(180-15);
}

module rib(angle) {
	r = 1.5;
	translate([
		(circumradius+addedThickness-r/2) * cos(angle), 
		(circumradius+addedThickness-r/2) * sin(angle) + outerYOff,
		0
	]) 
		rotate([0,0,angle])
		scale([1,2,1])
		cylinder(r=r, h=len, center=true);
}


module cutout() {
	translate([0, hexlightFlatDistance/3, 0]) 
		cylinder(r=circumradius + addedThickness, h=len+3, center=true, $fn=4);

}
